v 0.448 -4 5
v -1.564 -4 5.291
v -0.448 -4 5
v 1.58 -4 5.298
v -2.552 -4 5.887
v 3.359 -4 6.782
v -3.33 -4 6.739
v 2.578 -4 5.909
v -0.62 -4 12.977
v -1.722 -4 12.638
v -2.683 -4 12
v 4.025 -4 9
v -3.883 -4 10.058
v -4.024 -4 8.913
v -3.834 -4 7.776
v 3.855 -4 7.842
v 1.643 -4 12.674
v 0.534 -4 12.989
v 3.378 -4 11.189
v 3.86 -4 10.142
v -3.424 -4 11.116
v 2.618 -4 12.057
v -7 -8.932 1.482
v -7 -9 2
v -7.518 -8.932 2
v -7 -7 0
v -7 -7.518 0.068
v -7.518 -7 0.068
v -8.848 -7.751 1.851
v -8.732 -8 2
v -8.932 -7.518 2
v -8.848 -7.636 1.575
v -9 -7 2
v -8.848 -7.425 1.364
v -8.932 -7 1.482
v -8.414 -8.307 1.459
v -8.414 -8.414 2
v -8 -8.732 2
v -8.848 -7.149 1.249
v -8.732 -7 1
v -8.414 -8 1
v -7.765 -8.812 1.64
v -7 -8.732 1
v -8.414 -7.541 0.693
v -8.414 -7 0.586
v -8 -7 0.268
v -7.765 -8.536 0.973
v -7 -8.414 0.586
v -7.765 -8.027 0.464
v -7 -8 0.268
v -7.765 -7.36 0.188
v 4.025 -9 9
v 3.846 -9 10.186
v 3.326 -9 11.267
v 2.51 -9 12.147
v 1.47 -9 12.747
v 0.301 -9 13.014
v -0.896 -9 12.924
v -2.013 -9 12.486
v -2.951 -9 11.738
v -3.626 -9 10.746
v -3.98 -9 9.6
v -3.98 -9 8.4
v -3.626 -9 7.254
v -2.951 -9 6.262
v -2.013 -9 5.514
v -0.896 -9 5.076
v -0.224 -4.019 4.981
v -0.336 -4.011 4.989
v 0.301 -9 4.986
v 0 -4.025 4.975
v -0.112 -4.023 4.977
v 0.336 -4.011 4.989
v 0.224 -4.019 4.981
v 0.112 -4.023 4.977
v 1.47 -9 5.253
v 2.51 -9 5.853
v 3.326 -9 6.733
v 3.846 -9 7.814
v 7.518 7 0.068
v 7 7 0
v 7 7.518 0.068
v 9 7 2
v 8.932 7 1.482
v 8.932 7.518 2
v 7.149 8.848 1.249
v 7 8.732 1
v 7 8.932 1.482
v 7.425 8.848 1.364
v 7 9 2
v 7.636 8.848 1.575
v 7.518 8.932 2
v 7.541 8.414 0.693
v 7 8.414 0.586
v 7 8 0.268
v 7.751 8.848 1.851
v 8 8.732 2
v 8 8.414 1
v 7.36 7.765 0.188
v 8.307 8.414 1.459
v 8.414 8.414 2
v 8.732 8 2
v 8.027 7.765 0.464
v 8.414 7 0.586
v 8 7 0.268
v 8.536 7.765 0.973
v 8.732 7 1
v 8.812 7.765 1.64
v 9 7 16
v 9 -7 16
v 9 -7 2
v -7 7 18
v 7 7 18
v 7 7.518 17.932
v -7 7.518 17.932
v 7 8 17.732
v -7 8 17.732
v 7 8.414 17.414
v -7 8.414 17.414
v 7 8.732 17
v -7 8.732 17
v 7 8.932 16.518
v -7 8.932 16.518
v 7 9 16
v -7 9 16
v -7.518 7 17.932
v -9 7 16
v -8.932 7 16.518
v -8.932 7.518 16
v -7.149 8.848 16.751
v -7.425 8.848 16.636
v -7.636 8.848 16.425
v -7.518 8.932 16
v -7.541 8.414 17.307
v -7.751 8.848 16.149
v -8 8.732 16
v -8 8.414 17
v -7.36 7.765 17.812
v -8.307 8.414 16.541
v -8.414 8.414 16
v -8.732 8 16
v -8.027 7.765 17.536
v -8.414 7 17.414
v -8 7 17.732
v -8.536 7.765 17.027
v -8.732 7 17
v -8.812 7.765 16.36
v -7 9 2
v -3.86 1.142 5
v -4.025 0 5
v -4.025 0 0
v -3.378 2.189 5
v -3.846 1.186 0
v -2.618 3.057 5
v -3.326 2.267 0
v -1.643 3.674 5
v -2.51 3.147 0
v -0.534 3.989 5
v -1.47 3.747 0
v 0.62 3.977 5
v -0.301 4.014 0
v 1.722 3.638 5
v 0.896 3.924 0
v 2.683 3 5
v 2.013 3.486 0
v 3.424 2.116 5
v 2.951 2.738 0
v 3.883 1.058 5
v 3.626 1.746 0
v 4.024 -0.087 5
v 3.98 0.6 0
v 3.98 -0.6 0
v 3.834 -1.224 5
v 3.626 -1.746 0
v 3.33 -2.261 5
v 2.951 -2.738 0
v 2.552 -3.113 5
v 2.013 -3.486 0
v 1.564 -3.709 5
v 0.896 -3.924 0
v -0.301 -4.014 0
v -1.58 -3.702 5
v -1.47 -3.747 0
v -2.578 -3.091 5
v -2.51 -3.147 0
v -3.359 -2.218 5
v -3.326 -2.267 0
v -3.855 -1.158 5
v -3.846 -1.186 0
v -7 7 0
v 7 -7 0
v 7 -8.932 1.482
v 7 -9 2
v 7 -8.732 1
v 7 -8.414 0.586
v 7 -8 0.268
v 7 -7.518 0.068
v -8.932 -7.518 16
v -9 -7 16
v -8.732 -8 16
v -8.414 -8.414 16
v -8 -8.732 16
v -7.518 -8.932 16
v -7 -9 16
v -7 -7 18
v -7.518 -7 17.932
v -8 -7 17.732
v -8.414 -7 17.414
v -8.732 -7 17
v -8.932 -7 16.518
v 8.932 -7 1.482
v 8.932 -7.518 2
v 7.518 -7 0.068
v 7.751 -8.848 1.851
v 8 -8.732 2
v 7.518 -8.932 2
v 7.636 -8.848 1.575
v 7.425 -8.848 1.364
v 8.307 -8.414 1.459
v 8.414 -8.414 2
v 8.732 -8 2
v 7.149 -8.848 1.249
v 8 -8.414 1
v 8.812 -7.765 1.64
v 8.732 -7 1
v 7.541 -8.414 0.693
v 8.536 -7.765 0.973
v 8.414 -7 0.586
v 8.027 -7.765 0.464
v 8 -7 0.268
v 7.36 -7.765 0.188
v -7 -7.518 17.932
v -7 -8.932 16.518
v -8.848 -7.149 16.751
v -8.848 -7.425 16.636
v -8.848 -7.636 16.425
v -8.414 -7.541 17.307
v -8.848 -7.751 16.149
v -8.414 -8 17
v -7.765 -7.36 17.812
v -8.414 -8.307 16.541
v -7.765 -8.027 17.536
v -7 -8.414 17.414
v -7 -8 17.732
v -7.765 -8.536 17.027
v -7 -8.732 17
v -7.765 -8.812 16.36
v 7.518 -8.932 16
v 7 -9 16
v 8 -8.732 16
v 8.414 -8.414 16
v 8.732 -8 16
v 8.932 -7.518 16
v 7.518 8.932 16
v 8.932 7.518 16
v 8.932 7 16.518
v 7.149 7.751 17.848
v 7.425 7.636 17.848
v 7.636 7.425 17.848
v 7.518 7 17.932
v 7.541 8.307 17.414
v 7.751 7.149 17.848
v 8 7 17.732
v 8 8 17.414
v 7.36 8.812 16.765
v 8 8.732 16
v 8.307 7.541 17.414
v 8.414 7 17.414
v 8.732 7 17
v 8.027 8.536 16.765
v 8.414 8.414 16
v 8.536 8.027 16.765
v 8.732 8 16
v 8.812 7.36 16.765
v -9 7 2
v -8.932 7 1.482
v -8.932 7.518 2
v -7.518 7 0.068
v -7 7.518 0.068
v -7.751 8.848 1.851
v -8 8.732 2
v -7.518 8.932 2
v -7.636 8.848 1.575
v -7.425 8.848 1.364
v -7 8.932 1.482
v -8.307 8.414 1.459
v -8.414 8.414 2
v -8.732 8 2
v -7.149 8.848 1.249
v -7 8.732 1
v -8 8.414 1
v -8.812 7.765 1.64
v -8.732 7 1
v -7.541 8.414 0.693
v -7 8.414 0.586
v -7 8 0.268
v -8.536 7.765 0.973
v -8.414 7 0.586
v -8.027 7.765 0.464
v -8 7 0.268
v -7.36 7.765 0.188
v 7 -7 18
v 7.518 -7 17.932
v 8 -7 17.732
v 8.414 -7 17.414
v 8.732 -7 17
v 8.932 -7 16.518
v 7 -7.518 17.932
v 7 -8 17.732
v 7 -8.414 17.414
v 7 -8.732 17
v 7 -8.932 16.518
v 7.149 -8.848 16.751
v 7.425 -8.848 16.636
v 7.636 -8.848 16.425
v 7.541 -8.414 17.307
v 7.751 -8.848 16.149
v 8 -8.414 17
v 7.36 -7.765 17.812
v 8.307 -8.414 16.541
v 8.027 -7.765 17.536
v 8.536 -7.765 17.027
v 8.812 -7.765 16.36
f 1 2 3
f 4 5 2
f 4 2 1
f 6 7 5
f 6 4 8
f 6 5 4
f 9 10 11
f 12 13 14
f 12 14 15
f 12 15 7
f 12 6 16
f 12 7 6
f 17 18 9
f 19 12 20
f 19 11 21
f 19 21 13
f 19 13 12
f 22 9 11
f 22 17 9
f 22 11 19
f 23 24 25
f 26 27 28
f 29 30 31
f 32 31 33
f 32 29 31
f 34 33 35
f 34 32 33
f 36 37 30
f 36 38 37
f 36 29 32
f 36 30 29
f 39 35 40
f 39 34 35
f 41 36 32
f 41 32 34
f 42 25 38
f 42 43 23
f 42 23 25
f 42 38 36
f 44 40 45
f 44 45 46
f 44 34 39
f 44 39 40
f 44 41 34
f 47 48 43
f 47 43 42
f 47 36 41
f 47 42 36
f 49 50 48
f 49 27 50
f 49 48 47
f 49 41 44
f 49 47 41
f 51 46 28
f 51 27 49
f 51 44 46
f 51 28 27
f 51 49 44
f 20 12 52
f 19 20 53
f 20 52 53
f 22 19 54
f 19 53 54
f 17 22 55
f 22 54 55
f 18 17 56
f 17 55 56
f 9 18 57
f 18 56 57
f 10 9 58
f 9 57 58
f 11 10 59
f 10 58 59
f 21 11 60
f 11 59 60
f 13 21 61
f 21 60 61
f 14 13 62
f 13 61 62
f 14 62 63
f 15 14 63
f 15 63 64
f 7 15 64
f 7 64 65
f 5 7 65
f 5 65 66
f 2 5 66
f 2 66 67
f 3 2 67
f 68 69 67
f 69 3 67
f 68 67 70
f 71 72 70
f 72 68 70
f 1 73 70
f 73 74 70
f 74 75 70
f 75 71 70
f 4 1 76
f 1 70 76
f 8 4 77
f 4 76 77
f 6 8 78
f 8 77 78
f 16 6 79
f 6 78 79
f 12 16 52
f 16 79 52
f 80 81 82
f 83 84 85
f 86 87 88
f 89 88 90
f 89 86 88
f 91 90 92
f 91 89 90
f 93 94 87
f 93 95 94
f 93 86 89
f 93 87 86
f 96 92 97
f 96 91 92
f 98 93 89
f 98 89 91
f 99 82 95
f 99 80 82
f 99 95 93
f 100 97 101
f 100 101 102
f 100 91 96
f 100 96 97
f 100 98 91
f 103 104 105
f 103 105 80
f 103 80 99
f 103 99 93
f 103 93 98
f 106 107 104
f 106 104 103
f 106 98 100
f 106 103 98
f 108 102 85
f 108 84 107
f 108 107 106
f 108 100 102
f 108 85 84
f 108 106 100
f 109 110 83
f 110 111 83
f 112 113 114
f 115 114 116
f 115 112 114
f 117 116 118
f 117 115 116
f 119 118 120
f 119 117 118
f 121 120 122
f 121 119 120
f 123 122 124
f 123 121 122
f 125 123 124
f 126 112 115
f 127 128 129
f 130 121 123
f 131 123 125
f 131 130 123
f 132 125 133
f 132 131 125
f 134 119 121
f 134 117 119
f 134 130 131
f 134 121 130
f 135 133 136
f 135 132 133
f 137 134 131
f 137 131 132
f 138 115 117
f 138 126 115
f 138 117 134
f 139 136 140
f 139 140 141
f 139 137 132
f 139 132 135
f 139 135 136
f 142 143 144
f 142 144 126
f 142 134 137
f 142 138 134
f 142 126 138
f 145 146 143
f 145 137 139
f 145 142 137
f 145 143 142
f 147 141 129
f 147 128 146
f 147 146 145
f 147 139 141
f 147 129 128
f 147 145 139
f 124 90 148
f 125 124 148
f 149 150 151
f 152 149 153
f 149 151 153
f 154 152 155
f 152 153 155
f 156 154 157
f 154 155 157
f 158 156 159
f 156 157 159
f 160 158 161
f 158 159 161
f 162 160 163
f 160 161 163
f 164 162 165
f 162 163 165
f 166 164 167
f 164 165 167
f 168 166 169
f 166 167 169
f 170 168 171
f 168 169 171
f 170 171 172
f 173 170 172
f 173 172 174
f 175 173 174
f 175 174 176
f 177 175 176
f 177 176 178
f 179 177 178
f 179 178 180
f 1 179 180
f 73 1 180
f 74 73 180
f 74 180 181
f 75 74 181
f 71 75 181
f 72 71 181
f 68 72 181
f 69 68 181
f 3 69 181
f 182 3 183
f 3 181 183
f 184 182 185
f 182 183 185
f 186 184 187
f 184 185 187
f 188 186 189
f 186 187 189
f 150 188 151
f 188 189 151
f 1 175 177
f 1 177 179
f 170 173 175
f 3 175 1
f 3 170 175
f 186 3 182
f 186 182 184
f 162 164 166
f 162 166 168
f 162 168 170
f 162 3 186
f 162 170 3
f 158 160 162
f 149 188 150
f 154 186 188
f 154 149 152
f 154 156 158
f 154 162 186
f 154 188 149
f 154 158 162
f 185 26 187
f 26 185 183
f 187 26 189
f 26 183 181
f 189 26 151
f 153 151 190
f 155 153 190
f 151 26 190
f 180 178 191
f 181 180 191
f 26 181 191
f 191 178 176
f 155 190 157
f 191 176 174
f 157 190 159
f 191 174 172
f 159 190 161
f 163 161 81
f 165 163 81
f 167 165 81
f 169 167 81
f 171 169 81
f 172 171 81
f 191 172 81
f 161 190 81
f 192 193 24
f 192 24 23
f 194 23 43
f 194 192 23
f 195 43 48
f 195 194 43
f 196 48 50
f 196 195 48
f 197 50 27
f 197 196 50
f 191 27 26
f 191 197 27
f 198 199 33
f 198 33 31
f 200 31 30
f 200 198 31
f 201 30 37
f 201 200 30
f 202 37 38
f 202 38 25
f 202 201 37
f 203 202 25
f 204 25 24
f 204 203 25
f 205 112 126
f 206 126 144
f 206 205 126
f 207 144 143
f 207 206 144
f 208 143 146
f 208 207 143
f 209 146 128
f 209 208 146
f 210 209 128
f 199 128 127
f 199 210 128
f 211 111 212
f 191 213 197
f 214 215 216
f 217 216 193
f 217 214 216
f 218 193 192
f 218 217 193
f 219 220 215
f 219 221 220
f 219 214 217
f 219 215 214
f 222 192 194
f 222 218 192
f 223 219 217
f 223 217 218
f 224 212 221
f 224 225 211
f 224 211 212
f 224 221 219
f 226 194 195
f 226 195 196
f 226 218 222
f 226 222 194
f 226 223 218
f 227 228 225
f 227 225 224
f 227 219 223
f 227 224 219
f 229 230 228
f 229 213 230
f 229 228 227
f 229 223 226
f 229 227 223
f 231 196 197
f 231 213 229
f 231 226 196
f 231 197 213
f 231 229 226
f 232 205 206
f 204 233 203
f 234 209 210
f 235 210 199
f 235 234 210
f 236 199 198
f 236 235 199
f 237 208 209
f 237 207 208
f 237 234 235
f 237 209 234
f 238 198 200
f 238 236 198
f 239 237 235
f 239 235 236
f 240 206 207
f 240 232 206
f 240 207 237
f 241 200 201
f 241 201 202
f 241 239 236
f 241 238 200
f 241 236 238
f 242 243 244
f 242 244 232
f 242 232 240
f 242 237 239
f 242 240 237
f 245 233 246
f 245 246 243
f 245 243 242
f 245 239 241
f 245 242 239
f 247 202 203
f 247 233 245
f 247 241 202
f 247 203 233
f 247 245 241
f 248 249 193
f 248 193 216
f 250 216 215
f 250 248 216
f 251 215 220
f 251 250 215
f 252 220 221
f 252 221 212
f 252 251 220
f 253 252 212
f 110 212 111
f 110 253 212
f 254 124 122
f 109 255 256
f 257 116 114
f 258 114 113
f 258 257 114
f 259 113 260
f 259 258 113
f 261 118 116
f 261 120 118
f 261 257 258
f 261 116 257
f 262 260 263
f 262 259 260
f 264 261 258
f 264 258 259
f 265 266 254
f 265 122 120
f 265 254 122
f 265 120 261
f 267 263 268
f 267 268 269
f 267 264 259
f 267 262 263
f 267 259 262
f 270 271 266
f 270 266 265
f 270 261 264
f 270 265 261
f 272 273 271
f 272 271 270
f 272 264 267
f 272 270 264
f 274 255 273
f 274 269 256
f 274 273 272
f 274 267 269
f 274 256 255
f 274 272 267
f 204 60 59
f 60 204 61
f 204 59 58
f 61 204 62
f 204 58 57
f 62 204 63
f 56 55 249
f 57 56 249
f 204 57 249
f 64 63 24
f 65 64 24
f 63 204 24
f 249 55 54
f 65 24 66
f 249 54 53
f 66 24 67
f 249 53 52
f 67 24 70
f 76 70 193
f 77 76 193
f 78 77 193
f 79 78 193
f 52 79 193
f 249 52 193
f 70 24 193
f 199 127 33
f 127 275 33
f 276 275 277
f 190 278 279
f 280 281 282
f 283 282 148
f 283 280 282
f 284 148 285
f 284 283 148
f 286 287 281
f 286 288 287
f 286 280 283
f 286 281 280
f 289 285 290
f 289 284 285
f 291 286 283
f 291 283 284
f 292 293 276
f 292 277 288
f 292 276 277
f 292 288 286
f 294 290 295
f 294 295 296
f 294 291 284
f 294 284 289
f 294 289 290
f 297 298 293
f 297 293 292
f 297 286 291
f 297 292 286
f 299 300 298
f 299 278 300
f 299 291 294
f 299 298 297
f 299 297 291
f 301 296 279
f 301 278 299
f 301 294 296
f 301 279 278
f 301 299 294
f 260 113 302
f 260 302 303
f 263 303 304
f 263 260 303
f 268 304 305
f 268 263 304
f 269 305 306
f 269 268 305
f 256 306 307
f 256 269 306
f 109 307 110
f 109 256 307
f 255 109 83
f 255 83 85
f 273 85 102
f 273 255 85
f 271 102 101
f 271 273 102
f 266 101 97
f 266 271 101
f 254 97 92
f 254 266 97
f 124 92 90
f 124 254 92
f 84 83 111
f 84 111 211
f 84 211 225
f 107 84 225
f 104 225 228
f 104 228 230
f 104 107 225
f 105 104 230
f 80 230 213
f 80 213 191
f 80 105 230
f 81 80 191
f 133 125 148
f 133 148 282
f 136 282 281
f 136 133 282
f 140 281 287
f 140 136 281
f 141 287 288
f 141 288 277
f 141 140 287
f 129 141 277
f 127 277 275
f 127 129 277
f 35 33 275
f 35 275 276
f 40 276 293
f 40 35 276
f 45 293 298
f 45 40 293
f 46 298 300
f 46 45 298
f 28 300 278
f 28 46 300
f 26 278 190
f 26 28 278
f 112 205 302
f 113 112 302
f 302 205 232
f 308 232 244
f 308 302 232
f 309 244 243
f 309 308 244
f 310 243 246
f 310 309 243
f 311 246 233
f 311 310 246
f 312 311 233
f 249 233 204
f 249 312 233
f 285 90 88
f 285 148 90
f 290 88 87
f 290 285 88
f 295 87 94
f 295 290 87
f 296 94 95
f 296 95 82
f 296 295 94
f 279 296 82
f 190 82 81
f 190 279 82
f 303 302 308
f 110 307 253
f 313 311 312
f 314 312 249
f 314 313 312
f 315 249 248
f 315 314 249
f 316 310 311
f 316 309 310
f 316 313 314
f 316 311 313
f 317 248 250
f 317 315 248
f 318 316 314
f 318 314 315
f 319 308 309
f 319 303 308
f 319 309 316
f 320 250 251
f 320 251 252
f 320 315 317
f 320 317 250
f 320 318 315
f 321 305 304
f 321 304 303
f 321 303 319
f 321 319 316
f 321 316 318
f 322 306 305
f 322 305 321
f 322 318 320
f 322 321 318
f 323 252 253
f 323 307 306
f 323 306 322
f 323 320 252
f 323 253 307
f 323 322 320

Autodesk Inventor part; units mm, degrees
ref_plane "YZ Plane" through (0, 0, 0) normal (1, 0, 0) x (0, 1, 0)
ref_plane "XZ Plane" through (0, 0, 0) normal (0, 1, 0) x (-1, 0, 0)
ref_plane "XY Plane" through (0, 0, 0) normal (0, 0, 1) x (1, 0, 0)
sketch "Boceto1" plane through (0, 0, 0) normal (0, 0, 1) x (1, 0, 0)
  line L0 (9, 9) -> (-9, 9)
  line L1 (-9, 9) -> (-9, -9)
  line L2 (-9, -9) -> (9, -9)
  line L3 (9, -9) -> (9, 9)
  line L4 (9, 9) -> (-9, -9) construction
  line L5 (-9, 9) -> (9, -9) construction
  point P0 (0, 0)
  dimension "d0" = 18
extrude "Extrusión1" add sketch "Boceto1" along normal blind 18
fillet "Empalme1" radius 2 12 edges at (9, 0, 0) (9, 9, 9) (9, 0, 18) (9, -9, 9) (0, -9, 0) (0, -9, 18) (-9, -9, 9) (-9, 0, 0) (-9, 0, 18) (-9, 9, 9) (0, 9, 0) (0, 9, 18)
sketch "Boceto2" plane through (0, 0, 0) normal (0, 0, -1) x (-1, 0, 0)
  circle A0 centre (0, 0) radius 4.025
  dimension "d4" = 8.05
extrude "Extrusión2" cut sketch "Boceto2" against normal blind 5
sketch "Boceto3" plane through (-7, -9, 2) normal (0, -1, 0) x (1, 0, 0)
  circle A0 centre (7, 7) radius 4.025
  line L0 (14, 0) -> (0, 0) projected
  line L1 (0, 0) -> (0, 14) projected
  point P0 (7, -2)
  dimension "d7" = 8.05
  dimension "d8" = 7
  dimension "d9" = 7
extrude "Extrusión3" cut sketch "Boceto3" against normal blind 5
properties part number "Hombro"
